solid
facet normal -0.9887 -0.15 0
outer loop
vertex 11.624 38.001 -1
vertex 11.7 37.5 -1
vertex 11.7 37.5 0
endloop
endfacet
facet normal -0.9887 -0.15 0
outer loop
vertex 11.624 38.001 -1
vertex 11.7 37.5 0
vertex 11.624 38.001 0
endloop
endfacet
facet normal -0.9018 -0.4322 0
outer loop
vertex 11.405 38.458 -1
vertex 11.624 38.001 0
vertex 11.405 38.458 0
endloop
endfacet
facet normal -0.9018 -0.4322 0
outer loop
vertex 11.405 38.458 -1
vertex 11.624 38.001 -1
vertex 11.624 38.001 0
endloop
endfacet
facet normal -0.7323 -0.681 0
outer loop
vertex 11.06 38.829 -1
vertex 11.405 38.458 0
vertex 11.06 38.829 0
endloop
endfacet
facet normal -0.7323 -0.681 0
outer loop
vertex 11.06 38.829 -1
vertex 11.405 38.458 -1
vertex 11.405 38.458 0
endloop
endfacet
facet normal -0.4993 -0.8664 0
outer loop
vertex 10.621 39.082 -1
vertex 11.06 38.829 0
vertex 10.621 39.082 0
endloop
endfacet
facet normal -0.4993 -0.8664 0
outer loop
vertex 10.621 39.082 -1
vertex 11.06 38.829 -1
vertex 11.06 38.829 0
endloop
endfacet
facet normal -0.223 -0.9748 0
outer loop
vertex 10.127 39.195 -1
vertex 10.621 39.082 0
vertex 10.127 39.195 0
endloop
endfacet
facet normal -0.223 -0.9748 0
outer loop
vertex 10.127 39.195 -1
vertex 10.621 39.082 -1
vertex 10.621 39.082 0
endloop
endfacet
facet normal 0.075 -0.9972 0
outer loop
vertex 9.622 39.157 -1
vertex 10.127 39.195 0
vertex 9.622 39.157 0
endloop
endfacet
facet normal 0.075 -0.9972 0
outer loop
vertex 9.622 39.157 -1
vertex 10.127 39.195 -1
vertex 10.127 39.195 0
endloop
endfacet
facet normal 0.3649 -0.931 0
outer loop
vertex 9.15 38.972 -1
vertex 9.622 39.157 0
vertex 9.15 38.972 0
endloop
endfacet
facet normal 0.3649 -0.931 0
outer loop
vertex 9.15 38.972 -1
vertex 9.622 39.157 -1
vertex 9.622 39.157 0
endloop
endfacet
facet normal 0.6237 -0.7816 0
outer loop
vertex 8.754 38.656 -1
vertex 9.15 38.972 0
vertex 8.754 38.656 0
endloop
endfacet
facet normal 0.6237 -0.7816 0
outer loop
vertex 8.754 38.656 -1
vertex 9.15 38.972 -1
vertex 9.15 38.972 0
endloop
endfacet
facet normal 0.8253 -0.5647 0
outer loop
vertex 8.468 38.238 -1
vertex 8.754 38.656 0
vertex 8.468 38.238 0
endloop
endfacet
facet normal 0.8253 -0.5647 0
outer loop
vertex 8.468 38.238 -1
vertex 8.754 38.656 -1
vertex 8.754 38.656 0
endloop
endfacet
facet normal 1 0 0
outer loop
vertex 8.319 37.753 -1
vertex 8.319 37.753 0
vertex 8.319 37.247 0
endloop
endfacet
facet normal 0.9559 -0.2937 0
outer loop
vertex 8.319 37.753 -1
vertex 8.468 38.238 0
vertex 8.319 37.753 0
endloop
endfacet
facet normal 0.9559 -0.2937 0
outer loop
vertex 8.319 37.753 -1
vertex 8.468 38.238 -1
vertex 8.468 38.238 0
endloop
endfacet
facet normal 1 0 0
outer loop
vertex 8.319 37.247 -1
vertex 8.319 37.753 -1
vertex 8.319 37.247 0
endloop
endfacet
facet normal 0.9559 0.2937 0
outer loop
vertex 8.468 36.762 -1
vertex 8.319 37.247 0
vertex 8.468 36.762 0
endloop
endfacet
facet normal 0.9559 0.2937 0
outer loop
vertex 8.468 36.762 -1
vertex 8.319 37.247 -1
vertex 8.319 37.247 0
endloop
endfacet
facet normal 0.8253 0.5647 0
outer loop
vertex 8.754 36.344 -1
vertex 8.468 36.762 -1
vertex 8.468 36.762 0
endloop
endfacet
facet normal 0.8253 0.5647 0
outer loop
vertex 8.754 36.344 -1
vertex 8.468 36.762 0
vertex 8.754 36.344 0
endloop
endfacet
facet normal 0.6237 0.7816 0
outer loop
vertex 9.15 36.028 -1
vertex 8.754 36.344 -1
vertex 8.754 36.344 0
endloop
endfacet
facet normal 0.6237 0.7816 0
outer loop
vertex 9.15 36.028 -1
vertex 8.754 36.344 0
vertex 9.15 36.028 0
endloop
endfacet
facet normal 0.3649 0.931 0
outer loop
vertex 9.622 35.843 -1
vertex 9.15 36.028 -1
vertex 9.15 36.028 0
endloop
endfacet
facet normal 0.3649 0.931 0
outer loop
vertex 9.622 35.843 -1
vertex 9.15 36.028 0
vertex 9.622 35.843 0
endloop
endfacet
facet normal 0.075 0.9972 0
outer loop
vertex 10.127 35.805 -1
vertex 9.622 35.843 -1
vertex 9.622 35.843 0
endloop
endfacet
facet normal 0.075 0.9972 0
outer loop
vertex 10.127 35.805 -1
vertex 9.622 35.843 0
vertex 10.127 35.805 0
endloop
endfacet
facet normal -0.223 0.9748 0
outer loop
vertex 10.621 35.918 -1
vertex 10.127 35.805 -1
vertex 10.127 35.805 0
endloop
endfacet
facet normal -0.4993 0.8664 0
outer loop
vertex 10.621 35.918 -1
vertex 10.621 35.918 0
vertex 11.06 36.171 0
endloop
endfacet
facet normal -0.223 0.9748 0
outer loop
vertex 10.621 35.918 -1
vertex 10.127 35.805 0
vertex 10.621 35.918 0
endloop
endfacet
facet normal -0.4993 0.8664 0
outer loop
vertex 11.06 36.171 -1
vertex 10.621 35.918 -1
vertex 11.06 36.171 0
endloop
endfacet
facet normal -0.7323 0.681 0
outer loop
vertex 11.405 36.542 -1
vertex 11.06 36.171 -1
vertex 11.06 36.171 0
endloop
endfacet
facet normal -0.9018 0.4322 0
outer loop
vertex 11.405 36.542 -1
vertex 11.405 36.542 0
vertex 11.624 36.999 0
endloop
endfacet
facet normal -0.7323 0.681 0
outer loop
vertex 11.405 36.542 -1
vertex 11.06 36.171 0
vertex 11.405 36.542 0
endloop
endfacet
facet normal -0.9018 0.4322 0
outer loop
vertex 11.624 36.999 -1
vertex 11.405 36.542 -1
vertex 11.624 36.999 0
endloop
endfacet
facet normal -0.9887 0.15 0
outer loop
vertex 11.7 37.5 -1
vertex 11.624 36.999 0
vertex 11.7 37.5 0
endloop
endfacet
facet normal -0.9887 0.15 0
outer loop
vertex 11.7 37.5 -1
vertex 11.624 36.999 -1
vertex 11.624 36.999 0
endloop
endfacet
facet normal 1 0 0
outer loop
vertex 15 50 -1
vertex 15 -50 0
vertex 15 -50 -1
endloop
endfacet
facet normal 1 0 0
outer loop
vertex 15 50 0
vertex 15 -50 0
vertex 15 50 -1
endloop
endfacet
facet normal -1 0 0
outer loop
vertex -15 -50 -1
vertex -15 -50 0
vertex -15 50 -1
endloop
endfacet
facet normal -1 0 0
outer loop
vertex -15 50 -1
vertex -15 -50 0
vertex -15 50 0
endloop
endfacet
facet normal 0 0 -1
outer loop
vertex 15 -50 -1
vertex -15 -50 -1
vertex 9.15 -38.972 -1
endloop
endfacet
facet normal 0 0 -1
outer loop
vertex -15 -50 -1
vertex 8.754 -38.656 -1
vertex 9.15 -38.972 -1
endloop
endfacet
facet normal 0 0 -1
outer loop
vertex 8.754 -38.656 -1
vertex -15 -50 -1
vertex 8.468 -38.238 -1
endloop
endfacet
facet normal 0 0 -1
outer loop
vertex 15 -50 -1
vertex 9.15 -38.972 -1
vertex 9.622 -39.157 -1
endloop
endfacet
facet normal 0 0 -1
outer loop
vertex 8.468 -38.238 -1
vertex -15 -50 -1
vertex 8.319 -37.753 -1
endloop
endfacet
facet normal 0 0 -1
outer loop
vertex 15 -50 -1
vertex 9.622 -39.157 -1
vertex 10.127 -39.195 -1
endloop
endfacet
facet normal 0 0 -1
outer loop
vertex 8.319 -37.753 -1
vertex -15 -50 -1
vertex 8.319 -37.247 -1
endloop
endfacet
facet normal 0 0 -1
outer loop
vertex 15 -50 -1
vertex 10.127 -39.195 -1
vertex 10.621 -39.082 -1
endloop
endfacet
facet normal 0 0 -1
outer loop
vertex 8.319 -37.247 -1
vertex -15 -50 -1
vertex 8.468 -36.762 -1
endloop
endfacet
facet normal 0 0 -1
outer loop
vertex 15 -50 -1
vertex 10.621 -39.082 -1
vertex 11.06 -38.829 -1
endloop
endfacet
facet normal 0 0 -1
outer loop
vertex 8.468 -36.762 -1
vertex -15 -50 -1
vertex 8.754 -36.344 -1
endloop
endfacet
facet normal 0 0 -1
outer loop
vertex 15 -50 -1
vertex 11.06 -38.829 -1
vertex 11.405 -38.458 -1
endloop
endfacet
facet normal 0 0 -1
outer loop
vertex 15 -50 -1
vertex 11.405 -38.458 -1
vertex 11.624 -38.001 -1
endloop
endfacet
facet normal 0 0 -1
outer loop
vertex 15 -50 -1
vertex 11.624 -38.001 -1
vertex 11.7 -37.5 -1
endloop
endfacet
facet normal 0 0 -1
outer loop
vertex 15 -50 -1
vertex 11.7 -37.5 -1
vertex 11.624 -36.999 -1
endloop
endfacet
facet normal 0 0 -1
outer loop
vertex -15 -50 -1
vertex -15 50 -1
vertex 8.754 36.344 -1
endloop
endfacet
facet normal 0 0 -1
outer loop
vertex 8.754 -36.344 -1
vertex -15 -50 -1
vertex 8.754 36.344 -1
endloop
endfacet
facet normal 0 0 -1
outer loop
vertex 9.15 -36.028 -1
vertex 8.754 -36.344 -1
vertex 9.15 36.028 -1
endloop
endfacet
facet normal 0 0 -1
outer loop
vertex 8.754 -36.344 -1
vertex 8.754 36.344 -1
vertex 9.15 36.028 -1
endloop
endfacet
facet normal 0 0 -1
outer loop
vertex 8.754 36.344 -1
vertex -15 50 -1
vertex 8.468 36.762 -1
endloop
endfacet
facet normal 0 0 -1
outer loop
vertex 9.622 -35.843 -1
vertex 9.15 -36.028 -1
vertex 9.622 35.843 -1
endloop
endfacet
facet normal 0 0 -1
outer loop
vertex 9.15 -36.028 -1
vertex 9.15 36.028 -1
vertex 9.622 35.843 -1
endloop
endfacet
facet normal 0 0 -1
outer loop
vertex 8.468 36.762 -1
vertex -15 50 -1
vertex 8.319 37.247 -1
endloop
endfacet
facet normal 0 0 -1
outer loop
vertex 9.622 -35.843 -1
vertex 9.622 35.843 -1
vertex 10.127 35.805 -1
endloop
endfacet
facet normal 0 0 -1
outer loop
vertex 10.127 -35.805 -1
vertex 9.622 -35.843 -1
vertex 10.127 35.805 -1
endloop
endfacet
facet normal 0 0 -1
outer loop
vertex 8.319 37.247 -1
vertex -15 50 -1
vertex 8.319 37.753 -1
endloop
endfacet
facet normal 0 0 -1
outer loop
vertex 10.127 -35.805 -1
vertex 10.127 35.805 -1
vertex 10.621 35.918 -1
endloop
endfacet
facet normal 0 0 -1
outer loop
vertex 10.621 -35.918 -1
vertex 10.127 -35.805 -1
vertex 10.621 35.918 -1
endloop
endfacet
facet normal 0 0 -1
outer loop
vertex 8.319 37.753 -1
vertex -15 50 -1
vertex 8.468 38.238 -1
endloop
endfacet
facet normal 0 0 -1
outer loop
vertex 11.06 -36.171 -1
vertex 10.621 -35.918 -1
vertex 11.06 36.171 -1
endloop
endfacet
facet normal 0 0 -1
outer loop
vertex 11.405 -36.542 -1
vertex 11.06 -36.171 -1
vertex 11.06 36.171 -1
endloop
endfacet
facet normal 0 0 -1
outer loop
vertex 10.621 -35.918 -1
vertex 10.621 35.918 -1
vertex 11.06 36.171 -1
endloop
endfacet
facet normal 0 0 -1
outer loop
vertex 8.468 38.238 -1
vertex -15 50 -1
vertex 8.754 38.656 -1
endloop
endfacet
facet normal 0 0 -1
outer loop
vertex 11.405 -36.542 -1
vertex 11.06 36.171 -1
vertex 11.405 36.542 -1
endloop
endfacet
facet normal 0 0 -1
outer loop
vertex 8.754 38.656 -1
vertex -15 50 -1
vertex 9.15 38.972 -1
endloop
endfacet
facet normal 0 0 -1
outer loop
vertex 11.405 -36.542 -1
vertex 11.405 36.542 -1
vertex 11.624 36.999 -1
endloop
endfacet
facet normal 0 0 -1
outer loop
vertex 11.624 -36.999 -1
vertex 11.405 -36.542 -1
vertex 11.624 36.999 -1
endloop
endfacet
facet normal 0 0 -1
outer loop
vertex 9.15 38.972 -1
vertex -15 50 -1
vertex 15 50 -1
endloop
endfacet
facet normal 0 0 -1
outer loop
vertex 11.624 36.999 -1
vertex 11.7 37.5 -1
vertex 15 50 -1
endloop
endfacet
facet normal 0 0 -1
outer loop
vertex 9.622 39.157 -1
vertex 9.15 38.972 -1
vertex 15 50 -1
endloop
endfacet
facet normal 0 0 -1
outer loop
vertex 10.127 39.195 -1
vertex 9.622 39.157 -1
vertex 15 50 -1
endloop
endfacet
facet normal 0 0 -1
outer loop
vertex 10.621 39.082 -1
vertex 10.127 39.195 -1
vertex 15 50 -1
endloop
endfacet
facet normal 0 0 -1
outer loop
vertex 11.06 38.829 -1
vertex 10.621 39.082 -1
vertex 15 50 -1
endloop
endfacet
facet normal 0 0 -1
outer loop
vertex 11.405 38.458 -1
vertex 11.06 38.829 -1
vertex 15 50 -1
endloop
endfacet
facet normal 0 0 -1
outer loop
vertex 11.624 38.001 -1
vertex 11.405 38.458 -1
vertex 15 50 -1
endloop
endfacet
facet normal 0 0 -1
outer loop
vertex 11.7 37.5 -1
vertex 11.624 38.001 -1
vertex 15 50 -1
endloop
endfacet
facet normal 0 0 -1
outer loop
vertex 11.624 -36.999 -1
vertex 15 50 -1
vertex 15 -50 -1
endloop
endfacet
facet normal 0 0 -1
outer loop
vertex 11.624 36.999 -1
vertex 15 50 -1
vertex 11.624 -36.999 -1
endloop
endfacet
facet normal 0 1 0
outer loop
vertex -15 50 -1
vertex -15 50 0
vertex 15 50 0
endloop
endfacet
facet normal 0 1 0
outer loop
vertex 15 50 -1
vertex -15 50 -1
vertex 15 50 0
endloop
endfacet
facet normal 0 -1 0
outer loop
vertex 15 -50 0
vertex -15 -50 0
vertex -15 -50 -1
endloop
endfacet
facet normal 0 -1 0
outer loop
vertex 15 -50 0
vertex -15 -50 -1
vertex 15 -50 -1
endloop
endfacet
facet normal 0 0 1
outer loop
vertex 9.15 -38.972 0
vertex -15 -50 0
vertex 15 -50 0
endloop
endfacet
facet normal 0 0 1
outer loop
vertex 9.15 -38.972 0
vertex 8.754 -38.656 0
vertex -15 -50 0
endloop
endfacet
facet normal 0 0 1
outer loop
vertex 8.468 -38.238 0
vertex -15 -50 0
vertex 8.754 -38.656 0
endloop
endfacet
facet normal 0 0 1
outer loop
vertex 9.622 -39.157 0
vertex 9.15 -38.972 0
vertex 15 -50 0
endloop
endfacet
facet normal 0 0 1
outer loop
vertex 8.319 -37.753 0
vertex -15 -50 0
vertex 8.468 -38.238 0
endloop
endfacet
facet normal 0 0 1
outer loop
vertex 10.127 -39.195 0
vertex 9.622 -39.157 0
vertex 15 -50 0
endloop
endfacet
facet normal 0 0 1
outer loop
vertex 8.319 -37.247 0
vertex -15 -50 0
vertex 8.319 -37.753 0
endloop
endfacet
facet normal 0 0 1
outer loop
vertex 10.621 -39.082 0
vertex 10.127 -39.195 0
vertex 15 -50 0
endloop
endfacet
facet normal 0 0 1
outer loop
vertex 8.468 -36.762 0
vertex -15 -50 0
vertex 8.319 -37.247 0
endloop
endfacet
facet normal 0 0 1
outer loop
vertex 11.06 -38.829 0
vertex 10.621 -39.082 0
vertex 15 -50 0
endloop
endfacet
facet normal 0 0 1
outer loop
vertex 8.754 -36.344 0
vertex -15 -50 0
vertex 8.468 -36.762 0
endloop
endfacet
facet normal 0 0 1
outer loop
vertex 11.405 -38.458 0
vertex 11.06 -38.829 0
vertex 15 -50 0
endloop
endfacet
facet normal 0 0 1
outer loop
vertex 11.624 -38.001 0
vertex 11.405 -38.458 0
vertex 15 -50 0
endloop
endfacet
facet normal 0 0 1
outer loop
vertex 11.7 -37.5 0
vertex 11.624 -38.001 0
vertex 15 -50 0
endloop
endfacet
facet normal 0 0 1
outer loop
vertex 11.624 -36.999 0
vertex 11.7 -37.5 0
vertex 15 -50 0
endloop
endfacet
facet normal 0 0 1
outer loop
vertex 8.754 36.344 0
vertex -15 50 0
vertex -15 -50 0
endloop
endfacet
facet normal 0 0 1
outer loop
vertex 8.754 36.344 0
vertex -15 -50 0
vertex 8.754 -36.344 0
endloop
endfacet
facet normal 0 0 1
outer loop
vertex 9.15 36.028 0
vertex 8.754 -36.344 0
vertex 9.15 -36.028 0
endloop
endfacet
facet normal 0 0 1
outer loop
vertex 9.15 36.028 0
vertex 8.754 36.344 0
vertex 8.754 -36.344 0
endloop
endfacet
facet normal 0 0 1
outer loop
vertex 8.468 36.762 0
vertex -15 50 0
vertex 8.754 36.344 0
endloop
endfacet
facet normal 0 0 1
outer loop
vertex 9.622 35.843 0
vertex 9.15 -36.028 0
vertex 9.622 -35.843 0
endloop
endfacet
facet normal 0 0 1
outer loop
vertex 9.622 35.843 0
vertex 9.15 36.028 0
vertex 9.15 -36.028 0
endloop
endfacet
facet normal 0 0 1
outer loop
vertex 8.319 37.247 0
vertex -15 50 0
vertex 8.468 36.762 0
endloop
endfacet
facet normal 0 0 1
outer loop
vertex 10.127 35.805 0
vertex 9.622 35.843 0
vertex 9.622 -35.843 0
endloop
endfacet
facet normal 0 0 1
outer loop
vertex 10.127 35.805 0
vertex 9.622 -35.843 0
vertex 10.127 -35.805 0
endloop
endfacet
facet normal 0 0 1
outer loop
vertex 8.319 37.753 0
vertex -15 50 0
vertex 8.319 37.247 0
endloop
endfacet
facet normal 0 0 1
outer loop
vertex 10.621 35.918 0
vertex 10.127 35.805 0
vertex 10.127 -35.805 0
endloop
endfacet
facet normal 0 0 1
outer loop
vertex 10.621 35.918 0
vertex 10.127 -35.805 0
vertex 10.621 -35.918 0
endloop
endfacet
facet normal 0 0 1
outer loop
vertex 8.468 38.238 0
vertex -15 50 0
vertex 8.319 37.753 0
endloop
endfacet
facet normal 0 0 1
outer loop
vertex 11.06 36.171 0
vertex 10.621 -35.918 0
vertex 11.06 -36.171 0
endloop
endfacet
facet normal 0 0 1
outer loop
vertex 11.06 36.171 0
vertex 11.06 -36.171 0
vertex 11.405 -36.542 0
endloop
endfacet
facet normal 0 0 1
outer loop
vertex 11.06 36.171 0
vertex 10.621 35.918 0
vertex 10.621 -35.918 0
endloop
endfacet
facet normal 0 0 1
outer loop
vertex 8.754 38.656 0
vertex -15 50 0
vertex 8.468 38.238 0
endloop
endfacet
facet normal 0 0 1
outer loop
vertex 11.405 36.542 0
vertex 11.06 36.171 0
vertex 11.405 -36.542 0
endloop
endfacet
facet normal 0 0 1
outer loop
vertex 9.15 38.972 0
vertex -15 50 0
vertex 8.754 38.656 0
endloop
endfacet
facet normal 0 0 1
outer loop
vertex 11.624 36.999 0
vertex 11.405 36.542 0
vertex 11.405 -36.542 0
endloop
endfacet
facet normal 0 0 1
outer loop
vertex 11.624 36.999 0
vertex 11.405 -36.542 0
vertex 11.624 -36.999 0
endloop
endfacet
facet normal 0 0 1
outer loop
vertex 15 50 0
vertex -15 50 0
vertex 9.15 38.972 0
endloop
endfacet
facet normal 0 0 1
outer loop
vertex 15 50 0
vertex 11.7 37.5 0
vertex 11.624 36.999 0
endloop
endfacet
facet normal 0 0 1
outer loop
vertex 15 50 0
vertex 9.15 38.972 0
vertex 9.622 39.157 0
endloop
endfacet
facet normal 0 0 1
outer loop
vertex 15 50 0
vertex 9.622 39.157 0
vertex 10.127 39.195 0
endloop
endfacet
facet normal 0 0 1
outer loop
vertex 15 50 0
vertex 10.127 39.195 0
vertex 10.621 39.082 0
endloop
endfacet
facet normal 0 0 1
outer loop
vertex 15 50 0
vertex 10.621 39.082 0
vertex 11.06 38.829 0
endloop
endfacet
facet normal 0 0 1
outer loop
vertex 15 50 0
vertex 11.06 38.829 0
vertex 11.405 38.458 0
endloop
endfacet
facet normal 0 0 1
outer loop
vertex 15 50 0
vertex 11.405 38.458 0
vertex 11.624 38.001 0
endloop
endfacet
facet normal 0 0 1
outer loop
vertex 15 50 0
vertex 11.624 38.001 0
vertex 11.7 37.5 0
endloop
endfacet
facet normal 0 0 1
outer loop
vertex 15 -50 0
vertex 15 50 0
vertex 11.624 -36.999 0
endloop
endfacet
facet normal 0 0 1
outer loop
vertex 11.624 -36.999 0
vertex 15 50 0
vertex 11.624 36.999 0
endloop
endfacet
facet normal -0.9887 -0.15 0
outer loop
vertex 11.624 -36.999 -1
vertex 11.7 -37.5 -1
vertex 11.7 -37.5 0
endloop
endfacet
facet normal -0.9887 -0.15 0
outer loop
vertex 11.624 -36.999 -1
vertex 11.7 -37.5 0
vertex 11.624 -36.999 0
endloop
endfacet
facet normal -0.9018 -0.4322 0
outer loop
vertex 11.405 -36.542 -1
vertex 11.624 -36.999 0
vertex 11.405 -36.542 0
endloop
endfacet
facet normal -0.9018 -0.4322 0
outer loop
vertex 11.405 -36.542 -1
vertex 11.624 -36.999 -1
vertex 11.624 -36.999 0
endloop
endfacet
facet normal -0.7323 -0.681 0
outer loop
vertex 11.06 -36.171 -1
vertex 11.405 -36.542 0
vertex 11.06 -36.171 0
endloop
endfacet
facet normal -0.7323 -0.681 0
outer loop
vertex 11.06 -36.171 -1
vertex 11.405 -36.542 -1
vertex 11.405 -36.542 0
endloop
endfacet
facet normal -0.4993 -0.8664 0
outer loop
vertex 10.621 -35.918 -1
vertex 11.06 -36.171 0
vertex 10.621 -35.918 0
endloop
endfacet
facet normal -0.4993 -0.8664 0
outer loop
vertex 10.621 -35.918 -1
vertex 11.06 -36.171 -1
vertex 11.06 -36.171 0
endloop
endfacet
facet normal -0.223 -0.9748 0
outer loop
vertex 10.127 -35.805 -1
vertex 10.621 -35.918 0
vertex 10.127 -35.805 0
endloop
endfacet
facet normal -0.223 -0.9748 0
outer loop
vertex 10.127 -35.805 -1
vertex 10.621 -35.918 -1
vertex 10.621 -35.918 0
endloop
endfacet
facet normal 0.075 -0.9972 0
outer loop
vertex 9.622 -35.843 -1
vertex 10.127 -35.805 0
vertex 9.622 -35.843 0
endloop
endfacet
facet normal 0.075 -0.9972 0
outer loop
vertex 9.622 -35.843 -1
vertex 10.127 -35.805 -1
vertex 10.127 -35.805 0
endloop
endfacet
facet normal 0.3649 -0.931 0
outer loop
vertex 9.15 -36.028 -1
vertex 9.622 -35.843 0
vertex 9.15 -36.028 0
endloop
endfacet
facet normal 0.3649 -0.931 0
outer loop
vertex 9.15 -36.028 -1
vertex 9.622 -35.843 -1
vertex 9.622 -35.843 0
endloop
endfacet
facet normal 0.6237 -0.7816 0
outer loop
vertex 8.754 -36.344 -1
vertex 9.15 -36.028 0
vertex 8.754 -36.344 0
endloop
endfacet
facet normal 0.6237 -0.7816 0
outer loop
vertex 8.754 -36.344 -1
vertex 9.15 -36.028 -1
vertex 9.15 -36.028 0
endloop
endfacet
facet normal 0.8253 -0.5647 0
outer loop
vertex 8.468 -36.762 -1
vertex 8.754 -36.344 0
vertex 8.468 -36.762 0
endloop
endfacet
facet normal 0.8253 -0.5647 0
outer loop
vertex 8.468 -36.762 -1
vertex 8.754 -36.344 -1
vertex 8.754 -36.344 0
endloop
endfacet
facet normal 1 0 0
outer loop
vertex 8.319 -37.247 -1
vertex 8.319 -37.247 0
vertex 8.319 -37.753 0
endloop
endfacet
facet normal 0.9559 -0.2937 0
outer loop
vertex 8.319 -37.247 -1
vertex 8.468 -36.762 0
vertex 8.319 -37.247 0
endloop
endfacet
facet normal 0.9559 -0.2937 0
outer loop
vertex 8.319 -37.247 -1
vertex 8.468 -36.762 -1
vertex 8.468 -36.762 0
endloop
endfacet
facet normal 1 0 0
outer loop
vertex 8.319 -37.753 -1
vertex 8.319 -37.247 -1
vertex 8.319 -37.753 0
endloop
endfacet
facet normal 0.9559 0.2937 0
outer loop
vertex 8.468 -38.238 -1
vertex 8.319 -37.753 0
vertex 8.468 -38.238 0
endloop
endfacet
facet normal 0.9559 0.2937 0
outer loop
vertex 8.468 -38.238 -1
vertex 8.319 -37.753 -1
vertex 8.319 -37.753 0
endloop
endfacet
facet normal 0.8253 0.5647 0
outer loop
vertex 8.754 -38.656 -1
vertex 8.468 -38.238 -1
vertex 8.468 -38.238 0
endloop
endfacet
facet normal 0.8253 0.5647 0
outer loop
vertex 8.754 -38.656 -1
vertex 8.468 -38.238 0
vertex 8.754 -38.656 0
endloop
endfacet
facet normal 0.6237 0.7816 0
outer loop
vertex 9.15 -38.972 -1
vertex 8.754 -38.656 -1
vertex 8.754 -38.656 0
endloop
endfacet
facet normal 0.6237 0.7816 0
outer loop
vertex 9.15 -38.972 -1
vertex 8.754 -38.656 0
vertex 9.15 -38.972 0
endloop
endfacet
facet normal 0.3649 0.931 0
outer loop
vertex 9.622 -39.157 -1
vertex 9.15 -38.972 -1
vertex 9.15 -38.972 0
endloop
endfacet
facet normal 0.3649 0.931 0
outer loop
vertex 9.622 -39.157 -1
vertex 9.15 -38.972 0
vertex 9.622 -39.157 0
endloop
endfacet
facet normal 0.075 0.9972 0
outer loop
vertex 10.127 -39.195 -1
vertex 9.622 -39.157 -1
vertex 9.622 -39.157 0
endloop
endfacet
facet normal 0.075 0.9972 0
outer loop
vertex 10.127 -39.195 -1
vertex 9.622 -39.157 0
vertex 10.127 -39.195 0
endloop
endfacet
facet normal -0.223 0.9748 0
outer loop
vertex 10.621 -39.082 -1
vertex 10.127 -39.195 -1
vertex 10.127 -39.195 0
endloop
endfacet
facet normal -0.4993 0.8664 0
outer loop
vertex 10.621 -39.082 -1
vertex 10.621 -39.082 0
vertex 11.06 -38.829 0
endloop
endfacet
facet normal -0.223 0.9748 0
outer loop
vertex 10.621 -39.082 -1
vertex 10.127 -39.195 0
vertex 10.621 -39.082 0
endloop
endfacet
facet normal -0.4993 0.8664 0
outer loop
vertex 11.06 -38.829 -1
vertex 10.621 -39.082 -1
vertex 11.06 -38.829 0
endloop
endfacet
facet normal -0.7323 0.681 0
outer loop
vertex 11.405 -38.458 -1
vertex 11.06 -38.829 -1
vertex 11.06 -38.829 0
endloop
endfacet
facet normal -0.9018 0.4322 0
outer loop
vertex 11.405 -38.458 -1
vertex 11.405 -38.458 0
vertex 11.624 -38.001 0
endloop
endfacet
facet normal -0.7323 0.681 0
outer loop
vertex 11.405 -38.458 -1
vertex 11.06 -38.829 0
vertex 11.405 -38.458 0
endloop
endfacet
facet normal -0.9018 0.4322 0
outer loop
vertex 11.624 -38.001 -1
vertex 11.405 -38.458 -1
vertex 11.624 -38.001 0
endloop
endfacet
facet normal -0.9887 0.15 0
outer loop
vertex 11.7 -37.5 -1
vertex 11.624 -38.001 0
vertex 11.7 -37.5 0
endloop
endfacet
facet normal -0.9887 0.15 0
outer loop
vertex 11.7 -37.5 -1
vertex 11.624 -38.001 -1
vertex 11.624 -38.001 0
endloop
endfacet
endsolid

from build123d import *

# Parameters (mm, degrees)
SKETCH1_W               = 30
SKETCH1_H               = 100
BOSS_EXTRUDE1_DEPTH     = 1
CUT_EXTRUDE1_DEPTH      = 53.211109929
CUT_EXTRUDE1_DEPTH_BACK = 53.211109929
SKETCH2_R               = 1.7


with BuildPart() as part:
    # Sketch1 → Boss-Extrude1 (new body)
    with BuildSketch(Plane.XY):
        Rectangle(SKETCH1_W, SKETCH1_H)
    extrude(amount=-BOSS_EXTRUDE1_DEPTH)

    # Sketch2 → Cut-Extrude1 (cut, two sides: drawn at the far end of the back side and taken through both)
    with BuildSketch(Plane.XY.offset(-CUT_EXTRUDE1_DEPTH_BACK)):
        with Locations((10, -37.5)):
            Circle(SKETCH2_R)
        with Locations((10, 37.5)):
            Circle(SKETCH2_R)
    extrude(amount=CUT_EXTRUDE1_DEPTH + CUT_EXTRUDE1_DEPTH_BACK, mode=Mode.SUBTRACT)


solid = part.part
